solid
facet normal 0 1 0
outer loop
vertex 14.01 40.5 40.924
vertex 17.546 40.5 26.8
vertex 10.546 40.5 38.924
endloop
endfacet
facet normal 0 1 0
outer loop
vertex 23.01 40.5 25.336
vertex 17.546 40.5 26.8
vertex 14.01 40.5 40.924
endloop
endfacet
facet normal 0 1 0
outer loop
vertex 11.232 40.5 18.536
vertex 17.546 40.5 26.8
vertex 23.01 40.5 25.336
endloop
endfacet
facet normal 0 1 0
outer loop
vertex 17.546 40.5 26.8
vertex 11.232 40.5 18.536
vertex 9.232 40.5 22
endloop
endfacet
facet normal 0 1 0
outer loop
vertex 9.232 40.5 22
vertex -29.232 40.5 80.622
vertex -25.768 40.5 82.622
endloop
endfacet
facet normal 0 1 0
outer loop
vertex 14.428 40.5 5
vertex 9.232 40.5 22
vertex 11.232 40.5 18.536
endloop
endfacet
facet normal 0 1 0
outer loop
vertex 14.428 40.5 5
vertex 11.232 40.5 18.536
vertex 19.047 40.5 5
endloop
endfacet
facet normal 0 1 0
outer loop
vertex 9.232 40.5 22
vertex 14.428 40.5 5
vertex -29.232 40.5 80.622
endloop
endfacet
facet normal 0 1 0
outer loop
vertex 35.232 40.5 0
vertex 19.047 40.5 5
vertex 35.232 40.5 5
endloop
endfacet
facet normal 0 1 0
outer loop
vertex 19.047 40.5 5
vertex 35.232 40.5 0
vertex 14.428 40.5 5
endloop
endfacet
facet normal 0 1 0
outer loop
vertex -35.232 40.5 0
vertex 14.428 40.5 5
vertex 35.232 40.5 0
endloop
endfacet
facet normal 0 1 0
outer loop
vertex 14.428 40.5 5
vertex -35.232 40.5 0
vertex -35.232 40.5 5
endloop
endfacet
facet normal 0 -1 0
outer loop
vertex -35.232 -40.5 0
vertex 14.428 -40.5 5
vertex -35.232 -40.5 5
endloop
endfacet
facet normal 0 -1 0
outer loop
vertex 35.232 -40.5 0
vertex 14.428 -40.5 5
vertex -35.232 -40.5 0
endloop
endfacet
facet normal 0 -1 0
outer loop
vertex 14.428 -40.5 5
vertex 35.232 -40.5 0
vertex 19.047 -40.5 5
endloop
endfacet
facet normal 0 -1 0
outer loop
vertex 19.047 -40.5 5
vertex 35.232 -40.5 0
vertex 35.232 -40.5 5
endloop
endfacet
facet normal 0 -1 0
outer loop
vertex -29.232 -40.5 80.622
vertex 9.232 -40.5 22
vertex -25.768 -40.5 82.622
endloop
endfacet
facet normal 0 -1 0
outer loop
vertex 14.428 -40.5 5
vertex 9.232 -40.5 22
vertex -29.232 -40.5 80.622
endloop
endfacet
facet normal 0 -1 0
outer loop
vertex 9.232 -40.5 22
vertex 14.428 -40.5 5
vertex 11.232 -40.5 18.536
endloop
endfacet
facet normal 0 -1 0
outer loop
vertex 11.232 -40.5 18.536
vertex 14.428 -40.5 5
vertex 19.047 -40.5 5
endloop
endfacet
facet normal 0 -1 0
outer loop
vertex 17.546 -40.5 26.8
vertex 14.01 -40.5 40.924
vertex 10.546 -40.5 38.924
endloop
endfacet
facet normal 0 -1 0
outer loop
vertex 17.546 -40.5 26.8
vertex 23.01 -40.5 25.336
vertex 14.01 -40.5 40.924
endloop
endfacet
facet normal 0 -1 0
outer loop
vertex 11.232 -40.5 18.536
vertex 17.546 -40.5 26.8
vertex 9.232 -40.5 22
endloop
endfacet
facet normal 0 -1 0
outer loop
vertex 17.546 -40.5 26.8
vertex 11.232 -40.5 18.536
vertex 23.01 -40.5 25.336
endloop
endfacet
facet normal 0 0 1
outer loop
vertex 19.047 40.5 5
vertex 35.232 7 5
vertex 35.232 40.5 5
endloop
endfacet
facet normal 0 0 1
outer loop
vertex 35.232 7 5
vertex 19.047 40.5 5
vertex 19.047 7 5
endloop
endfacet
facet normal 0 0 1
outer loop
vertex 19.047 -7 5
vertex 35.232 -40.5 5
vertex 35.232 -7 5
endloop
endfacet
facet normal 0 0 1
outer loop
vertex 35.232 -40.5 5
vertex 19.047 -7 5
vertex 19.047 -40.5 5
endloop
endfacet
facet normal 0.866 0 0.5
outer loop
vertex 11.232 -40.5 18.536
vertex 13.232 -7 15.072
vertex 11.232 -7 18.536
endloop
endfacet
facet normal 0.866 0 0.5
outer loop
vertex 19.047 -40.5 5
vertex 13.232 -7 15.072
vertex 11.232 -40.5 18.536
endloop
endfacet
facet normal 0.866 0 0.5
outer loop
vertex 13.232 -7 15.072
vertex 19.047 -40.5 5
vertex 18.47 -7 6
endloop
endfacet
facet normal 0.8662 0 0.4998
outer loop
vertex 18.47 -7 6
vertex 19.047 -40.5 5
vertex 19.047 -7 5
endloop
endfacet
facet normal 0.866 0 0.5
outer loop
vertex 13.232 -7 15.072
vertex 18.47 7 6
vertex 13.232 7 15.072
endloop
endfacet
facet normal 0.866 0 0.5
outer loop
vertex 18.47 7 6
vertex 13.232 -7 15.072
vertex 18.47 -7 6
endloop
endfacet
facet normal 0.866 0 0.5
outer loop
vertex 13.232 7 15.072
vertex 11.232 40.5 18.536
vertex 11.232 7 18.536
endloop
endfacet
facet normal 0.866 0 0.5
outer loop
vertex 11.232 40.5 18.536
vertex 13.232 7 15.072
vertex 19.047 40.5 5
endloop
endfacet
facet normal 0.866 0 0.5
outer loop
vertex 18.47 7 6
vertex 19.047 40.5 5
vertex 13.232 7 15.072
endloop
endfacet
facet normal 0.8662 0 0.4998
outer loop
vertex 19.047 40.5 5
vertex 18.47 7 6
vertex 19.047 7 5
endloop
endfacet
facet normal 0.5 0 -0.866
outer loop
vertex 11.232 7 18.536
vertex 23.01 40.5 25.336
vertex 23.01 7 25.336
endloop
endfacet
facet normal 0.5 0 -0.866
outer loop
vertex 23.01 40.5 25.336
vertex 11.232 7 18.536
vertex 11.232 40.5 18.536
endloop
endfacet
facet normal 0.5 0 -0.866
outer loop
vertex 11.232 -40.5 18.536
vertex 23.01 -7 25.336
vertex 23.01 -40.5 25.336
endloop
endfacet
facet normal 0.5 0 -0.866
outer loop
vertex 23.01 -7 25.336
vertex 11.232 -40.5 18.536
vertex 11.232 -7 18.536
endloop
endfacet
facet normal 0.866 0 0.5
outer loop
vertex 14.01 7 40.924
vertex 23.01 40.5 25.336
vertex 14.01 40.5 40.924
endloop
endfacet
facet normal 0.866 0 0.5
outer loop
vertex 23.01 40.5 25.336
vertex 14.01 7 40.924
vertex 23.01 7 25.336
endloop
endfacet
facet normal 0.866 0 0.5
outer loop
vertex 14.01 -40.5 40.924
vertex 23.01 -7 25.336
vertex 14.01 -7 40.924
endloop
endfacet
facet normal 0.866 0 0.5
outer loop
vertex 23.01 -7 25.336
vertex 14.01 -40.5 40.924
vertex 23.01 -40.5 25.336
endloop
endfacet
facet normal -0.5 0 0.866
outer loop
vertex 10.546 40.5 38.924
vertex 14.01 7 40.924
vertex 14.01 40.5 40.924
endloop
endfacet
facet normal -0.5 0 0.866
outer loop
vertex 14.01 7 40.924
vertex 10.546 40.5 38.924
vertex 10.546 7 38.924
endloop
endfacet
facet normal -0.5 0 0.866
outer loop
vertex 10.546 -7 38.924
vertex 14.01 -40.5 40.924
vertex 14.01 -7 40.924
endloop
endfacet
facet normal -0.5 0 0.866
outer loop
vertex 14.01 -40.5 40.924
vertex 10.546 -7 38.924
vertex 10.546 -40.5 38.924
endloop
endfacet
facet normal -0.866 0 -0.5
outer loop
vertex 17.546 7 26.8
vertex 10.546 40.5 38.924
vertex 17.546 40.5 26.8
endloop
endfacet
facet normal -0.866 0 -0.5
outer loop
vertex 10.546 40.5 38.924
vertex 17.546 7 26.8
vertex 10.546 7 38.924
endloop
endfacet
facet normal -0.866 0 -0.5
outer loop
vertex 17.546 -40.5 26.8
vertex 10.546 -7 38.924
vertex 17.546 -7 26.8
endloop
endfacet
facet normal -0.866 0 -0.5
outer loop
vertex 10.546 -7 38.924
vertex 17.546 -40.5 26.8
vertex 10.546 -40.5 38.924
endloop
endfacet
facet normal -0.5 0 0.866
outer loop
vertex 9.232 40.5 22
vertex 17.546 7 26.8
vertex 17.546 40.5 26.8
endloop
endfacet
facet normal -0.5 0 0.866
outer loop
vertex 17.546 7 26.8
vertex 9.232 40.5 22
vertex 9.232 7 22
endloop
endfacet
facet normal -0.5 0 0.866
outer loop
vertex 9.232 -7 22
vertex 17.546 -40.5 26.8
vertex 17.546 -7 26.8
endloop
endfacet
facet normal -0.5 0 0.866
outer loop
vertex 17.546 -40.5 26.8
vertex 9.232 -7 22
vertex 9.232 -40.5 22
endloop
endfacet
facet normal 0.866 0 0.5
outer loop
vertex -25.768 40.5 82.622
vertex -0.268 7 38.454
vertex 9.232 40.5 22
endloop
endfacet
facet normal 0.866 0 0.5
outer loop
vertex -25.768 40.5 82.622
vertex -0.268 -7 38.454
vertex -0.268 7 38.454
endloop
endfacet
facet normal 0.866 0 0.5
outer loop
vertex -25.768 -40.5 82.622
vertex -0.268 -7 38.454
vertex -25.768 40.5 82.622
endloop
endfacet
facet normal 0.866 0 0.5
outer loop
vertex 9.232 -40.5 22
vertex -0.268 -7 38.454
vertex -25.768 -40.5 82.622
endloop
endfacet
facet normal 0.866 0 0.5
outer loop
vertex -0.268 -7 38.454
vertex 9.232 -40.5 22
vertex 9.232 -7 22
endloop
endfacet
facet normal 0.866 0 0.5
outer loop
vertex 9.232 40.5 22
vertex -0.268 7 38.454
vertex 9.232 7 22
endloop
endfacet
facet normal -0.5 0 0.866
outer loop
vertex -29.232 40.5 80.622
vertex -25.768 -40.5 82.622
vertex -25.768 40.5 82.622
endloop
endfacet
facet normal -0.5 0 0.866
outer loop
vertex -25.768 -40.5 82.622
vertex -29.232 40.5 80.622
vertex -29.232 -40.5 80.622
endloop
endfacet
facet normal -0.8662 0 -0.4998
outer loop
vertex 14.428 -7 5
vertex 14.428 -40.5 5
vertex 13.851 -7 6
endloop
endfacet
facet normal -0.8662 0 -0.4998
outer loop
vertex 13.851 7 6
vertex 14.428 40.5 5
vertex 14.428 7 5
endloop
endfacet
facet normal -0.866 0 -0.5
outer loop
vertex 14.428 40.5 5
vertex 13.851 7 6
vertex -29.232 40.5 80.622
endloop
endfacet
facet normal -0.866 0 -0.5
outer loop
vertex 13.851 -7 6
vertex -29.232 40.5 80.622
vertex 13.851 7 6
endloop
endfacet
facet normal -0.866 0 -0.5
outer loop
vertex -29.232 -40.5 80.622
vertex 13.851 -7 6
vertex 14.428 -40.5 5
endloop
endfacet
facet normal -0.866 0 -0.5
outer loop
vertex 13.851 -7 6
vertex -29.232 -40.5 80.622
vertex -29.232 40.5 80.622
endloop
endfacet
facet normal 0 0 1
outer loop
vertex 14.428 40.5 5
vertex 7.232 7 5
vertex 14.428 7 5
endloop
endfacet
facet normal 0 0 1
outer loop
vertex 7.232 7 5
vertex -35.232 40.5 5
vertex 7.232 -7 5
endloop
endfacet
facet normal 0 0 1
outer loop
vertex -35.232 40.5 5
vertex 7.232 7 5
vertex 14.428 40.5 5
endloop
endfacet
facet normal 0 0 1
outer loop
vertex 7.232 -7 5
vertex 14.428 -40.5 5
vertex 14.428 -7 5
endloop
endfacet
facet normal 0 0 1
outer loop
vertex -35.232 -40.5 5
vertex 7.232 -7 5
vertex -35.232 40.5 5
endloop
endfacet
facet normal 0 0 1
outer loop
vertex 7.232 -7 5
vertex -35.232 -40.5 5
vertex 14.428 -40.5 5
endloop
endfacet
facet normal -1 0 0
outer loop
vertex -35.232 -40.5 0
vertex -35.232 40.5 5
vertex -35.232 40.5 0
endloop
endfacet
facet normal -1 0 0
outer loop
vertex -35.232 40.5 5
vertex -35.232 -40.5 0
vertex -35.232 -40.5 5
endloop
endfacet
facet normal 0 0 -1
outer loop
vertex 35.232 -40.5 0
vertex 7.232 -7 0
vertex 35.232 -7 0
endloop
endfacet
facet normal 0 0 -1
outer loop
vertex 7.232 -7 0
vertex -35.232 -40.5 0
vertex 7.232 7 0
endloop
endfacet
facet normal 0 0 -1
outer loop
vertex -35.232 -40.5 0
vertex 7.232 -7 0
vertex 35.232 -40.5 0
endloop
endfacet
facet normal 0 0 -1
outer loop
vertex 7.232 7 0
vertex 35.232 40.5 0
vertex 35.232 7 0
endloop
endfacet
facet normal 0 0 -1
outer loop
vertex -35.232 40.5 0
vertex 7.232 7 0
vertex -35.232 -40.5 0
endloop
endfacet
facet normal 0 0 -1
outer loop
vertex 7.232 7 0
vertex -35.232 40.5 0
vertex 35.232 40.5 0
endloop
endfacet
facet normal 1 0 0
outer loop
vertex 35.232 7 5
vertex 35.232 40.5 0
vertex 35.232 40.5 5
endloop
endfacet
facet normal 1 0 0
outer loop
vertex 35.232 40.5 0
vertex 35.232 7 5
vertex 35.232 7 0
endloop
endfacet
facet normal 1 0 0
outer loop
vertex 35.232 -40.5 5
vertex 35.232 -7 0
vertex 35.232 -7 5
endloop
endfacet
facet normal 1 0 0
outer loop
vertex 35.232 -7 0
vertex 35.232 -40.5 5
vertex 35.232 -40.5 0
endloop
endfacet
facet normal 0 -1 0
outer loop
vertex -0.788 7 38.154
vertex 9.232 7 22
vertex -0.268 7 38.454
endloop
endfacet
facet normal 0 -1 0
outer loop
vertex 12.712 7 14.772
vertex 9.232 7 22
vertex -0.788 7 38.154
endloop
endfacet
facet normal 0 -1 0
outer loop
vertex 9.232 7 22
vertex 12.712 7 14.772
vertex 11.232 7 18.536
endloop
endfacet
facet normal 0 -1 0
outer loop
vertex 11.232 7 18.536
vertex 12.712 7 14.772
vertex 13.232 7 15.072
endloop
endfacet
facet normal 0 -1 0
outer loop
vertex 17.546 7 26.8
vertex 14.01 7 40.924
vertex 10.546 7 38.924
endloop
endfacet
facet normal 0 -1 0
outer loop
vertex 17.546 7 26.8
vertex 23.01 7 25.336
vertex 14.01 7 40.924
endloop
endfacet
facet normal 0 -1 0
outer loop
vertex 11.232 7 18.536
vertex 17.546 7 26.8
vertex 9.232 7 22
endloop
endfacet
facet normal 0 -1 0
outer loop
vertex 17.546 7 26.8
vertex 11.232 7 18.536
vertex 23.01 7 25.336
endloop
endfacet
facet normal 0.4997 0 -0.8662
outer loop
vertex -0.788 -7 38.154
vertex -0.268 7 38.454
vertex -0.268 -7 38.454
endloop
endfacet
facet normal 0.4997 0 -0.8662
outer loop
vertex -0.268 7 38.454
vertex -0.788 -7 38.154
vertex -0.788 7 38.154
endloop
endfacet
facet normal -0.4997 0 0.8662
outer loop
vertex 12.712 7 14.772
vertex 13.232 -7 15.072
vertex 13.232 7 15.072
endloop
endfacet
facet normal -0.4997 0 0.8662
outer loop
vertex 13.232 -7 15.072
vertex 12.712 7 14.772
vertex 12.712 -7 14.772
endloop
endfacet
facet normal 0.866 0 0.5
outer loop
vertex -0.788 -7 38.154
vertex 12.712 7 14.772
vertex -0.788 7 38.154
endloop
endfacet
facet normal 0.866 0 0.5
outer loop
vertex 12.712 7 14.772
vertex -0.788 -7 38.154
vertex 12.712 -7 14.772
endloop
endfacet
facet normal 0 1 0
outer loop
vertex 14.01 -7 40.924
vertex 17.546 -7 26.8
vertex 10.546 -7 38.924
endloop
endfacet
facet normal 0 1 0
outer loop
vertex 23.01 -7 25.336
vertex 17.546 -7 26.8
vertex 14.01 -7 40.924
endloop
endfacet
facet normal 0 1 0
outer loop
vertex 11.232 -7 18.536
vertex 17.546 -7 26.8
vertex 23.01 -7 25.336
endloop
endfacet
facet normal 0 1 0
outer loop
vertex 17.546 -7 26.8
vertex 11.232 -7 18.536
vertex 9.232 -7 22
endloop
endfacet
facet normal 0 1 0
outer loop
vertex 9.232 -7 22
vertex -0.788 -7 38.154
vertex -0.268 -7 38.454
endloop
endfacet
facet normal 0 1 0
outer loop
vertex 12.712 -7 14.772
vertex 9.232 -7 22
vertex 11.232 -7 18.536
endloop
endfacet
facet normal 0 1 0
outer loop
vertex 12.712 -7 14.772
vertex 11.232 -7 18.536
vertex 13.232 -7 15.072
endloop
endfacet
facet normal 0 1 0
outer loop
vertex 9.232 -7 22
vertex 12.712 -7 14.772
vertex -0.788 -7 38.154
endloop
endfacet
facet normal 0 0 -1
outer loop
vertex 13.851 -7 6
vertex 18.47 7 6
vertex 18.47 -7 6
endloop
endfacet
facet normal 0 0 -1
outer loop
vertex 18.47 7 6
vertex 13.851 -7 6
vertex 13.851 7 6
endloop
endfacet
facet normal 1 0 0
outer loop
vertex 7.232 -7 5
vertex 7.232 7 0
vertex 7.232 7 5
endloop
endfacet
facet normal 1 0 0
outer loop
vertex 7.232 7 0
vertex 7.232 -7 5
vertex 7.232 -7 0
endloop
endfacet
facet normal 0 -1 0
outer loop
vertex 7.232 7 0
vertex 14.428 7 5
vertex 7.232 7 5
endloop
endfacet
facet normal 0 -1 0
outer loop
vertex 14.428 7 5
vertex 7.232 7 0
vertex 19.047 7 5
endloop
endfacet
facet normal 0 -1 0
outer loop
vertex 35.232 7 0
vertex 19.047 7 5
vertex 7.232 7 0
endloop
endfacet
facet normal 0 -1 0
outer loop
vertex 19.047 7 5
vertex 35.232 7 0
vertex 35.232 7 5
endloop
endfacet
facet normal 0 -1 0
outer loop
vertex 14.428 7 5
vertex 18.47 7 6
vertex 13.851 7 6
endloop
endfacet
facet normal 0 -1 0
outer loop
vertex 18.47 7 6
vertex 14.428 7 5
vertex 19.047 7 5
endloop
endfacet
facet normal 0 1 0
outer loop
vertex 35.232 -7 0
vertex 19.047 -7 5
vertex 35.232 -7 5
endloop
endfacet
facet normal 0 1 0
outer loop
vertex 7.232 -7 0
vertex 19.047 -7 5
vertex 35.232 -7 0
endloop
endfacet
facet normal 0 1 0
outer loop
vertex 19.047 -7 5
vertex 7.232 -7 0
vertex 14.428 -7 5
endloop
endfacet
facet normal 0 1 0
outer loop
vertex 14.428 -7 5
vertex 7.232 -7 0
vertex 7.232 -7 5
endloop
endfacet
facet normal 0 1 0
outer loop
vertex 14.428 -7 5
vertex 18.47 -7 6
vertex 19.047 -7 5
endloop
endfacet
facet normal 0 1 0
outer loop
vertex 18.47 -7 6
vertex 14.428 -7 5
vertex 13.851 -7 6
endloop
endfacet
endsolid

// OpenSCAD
/* [Phone] */
// Phone width including case
phone_width = 75; // [50:120]
// Phone thickness including case
phone_thickness = 9; // [5:0.5:20]
// Extra clearance in the cradle channel
fit_clearance = 0.6; // [0.2:0.1:2]

/* [Stand] */
// Recline angle from horizontal
recline = 60; // [40:80]
// Backrest length measured along the phone
back_length = 70; // [40:120]
// Front lip height measured along the phone face
lip_height = 14; // [8:30]
// Wall thickness
wall = 4; // [3:0.5:8]
// Cradle floor height above the desk (room for the cable plug)
floor_raise = 22; // [14:40]

/* [Cable slot] */
// Width of the charging-cable slot
slot_width = 14; // [8:24]

/* [Base] */
// Base length behind the backrest top (anti-tip margin)
base_back_margin = 6; // [0:20]
// Base length in front of the lip
base_front = 26; // [10:50]
// Base plate thickness
base_thickness = 5; // [3:0.5:8]

$fn = 64;

// ---- Derived values ----
stand_width = phone_width + 6;                  // slightly wider than the phone
channel = phone_thickness + fit_clearance;      // cradle gap
phi = 90 - recline;                             // profile tilt from vertical
strut_ext = (floor_raise + wall) / sin(recline) + 5; // backrest extension down to the desk
base_back_x = -wall * cos(phi) - back_length * sin(phi) - base_back_margin;
base_len = base_front - base_back_x;
x_center = (base_back_x + base_front) / 2;      // for centering on origin

// Side silhouette in 2D (x = depth, y = height)
module profile2d() {
    intersection() {
        union() {
            // Reclined assembly, pivoted at the cradle inner corner
            translate([0, floor_raise]) rotate(phi) {
                // Backrest + strut continuing down to the base
                translate([-wall, -strut_ext])
                    square([wall, back_length + strut_ext]);
                // Cradle floor
                translate([-wall, -wall])
                    square([wall + channel + wall, wall]);
                // Front lip
                translate([channel, -wall])
                    square([wall, lip_height + wall]);
            }
            // Base plate
            translate([base_back_x, 0])
                square([base_len, base_thickness]);
        }
        // Trim everything below the desk plane
        translate([-500, 0]) square([1000, 1000]);
    }
}

// Slot through the cradle floor and front lip, aligned with the phone
module slot_cutter() {
    translate([0, 0, floor_raise])
        rotate([0, recline - 90, 0])
            translate([-0.6, -slot_width / 2, -(wall + 4)])
                cube([channel + wall + 2, slot_width, wall + 4 + lip_height + 5]);
}

// Groove through the base plate so the cable can run out along the desk
module base_groove() {
    translate([-2, -slot_width / 2, -1])
        cube([base_front + 3, slot_width, base_thickness + 2]);
}

module stand() {
    difference() {
        rotate([90, 0, 0])
            linear_extrude(height = stand_width, center = true)
                profile2d();
        slot_cutter();
        base_groove();
    }
}

translate([-x_center, 0, 0]) stand();
